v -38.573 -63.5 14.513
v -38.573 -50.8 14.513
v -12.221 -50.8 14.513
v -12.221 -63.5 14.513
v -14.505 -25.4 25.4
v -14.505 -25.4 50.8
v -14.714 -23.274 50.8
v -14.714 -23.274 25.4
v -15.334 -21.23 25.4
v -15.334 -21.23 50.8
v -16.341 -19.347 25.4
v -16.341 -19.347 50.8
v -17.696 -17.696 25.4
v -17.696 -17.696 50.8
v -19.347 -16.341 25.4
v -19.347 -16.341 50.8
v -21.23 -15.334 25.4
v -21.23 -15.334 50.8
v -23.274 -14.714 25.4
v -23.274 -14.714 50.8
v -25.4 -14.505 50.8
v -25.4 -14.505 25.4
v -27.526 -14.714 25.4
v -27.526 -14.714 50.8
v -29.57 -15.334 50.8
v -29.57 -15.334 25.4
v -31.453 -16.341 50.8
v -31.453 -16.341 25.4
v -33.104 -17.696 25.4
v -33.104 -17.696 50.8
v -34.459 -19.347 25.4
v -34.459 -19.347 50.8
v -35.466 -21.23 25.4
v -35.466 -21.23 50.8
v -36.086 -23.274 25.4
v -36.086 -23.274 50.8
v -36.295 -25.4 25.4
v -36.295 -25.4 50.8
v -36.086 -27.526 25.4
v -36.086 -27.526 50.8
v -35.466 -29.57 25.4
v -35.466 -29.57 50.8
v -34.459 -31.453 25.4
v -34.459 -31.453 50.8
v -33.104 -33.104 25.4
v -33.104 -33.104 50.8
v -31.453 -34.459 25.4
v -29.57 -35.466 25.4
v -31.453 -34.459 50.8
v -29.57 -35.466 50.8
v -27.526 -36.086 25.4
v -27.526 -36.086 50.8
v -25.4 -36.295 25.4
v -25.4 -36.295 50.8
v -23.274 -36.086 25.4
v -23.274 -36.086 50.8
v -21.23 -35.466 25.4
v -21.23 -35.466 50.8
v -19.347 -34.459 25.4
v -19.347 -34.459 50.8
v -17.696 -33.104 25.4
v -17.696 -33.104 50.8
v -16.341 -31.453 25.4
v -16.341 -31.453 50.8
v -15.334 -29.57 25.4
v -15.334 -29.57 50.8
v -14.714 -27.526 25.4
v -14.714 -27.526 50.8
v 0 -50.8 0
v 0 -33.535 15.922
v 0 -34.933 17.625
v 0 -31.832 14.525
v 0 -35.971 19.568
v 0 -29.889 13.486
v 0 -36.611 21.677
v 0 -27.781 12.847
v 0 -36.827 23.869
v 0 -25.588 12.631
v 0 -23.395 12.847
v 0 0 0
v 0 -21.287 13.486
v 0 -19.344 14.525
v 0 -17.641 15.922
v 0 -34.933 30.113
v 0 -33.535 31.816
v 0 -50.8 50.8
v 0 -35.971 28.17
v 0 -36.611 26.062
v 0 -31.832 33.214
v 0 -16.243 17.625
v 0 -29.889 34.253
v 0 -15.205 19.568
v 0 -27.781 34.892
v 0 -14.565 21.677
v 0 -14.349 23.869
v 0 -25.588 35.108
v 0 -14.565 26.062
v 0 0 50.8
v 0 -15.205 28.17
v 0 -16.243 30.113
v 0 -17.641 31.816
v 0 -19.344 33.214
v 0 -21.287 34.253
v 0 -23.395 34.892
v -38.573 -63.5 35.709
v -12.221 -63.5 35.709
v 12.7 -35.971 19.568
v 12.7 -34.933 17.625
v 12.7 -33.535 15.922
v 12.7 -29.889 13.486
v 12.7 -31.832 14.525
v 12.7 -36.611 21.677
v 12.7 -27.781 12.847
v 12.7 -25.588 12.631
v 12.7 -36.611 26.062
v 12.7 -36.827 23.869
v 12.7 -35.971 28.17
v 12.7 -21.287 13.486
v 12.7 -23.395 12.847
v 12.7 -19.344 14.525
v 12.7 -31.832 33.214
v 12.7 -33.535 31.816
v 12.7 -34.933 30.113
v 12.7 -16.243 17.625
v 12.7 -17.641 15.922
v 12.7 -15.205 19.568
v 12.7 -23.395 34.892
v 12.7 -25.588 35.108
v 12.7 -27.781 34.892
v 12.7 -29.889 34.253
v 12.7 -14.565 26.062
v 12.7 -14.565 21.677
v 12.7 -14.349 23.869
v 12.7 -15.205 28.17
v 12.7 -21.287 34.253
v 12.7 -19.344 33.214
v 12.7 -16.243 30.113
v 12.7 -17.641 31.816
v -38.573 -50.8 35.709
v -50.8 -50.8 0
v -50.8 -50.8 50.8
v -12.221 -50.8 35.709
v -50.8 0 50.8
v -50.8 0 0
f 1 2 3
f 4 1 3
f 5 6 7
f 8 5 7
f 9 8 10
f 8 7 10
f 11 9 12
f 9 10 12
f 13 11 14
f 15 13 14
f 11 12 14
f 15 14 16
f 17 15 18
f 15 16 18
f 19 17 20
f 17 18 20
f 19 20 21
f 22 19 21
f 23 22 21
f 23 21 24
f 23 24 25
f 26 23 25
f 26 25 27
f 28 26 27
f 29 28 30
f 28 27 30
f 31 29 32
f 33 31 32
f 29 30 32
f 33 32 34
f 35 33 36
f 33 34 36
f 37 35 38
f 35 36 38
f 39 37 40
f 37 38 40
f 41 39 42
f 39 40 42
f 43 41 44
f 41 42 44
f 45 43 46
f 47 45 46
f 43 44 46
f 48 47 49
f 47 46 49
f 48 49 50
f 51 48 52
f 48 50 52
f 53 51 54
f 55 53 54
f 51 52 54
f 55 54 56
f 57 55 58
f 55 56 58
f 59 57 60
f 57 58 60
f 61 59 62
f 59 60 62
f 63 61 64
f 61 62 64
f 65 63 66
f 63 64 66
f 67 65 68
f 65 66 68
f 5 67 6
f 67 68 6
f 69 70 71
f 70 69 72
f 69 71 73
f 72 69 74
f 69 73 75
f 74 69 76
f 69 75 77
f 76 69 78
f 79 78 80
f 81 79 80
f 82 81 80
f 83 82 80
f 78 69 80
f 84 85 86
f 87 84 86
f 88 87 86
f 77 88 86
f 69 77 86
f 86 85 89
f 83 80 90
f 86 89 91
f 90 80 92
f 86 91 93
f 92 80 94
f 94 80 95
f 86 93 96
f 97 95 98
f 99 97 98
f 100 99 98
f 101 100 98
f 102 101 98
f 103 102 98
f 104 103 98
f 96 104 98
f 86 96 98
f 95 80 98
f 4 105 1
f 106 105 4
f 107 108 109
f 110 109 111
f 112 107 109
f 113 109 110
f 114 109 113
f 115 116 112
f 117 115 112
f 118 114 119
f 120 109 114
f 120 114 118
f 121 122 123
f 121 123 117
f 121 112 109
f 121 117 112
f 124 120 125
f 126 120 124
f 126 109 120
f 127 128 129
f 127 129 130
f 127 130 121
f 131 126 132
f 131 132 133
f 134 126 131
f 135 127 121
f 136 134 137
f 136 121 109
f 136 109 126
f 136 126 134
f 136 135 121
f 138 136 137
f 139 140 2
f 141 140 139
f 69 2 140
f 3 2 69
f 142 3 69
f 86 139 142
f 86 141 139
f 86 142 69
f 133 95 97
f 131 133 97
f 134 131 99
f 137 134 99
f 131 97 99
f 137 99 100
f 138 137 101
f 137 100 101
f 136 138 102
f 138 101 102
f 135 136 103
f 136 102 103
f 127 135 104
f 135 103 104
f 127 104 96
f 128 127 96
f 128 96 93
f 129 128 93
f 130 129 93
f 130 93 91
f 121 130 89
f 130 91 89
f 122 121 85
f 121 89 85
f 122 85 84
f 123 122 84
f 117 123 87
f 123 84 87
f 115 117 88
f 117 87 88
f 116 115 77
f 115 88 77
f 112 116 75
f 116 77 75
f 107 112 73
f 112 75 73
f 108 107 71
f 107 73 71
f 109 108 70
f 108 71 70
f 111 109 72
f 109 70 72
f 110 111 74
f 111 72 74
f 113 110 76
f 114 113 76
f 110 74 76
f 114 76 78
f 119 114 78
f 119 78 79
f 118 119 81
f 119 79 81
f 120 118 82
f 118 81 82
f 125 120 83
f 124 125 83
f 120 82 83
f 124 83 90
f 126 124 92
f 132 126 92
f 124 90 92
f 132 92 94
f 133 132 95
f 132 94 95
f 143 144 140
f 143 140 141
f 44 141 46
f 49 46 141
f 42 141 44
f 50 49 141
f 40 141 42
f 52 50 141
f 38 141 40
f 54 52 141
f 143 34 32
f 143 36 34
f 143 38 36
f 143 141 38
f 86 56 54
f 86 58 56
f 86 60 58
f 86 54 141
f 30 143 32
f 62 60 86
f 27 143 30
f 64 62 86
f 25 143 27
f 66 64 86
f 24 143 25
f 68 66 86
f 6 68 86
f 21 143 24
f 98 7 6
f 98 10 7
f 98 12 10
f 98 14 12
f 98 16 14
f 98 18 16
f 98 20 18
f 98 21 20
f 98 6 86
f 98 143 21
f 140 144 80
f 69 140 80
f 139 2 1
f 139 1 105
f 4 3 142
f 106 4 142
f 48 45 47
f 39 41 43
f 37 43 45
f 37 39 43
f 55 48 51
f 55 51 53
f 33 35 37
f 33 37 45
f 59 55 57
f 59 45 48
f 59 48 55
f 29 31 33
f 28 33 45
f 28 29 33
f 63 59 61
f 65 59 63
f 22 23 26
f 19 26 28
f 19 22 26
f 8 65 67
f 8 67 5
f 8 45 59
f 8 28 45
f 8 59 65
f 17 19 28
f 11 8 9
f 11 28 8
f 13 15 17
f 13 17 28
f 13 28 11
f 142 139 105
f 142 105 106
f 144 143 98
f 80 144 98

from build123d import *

# Parameters (mm, degrees)
F0_W      = 50.8
F0_H      = 50.8
F1_DEPTH  = 50.8
F2_R      = 10.8954734827
F3_DEPTH  = 25.4
F4_W      = 25.4
F4_H      = 25.4
F5_DEPTH  = 25.4
F6_DEPTH  = 12.7
F7_DEPTH  = 38.1
F8_W      = 26.3517424464
F8_H      = 21.1959667504
F9_DEPTH  = 12.7
F10_R     = 11.2387805826
F11_DEPTH = 12.7


with BuildPart() as f1:
    # F0 (on Front) → F1 (new body)
    with BuildSketch(Plane.XZ):
        with Locations((-25.4, 25.4)):
            Rectangle(F0_W, F0_H)
    extrude(amount=F1_DEPTH)

    # F2 (on face) → F3 (cut)
    with BuildSketch(Plane.XY.offset(50.8)):
        with Locations((-25.4, -25.4)):
            Circle(F2_R)
    extrude(amount=-F3_DEPTH, mode=Mode.SUBTRACT)

    # F4 (on face) → F5 (join)
    with BuildSketch(Plane.XZ.offset(50.8)):
        with Locations((-25.4, 25.4)):
            Rectangle(F4_W, F4_H)
    extrude(amount=F5_DEPTH)

    # F6 (add): a face of the model
    f6_faces = [f1.faces().sort_by_distance(p)[0] for p in [
        (-25.4, -76.2, 25.4),
    ]]
    extrude(f6_faces, amount=F6_DEPTH)

    # F7 (cut): a face of the model
    f7_faces = [f1.faces().sort_by_distance(p)[0] for p in [
        (-25.4, -88.9, 25.4),
    ]]
    extrude(f7_faces, amount=-F7_DEPTH, mode=Mode.SUBTRACT)

    # F8 (on face) → F9 (join)
    with BuildSketch(Plane.XZ.offset(50.8)):
        with Locations((-25.3969691694, 25.1105371863)):
            Rectangle(F8_W, F8_H)
    extrude(amount=F9_DEPTH)

    # F10 (on face) → F11 (join)
    with BuildSketch(Plane.YZ):
        with Locations((-25.5879238248, 23.8693319261)):
            Circle(F10_R)
    extrude(amount=F11_DEPTH)


solid = f1.part
